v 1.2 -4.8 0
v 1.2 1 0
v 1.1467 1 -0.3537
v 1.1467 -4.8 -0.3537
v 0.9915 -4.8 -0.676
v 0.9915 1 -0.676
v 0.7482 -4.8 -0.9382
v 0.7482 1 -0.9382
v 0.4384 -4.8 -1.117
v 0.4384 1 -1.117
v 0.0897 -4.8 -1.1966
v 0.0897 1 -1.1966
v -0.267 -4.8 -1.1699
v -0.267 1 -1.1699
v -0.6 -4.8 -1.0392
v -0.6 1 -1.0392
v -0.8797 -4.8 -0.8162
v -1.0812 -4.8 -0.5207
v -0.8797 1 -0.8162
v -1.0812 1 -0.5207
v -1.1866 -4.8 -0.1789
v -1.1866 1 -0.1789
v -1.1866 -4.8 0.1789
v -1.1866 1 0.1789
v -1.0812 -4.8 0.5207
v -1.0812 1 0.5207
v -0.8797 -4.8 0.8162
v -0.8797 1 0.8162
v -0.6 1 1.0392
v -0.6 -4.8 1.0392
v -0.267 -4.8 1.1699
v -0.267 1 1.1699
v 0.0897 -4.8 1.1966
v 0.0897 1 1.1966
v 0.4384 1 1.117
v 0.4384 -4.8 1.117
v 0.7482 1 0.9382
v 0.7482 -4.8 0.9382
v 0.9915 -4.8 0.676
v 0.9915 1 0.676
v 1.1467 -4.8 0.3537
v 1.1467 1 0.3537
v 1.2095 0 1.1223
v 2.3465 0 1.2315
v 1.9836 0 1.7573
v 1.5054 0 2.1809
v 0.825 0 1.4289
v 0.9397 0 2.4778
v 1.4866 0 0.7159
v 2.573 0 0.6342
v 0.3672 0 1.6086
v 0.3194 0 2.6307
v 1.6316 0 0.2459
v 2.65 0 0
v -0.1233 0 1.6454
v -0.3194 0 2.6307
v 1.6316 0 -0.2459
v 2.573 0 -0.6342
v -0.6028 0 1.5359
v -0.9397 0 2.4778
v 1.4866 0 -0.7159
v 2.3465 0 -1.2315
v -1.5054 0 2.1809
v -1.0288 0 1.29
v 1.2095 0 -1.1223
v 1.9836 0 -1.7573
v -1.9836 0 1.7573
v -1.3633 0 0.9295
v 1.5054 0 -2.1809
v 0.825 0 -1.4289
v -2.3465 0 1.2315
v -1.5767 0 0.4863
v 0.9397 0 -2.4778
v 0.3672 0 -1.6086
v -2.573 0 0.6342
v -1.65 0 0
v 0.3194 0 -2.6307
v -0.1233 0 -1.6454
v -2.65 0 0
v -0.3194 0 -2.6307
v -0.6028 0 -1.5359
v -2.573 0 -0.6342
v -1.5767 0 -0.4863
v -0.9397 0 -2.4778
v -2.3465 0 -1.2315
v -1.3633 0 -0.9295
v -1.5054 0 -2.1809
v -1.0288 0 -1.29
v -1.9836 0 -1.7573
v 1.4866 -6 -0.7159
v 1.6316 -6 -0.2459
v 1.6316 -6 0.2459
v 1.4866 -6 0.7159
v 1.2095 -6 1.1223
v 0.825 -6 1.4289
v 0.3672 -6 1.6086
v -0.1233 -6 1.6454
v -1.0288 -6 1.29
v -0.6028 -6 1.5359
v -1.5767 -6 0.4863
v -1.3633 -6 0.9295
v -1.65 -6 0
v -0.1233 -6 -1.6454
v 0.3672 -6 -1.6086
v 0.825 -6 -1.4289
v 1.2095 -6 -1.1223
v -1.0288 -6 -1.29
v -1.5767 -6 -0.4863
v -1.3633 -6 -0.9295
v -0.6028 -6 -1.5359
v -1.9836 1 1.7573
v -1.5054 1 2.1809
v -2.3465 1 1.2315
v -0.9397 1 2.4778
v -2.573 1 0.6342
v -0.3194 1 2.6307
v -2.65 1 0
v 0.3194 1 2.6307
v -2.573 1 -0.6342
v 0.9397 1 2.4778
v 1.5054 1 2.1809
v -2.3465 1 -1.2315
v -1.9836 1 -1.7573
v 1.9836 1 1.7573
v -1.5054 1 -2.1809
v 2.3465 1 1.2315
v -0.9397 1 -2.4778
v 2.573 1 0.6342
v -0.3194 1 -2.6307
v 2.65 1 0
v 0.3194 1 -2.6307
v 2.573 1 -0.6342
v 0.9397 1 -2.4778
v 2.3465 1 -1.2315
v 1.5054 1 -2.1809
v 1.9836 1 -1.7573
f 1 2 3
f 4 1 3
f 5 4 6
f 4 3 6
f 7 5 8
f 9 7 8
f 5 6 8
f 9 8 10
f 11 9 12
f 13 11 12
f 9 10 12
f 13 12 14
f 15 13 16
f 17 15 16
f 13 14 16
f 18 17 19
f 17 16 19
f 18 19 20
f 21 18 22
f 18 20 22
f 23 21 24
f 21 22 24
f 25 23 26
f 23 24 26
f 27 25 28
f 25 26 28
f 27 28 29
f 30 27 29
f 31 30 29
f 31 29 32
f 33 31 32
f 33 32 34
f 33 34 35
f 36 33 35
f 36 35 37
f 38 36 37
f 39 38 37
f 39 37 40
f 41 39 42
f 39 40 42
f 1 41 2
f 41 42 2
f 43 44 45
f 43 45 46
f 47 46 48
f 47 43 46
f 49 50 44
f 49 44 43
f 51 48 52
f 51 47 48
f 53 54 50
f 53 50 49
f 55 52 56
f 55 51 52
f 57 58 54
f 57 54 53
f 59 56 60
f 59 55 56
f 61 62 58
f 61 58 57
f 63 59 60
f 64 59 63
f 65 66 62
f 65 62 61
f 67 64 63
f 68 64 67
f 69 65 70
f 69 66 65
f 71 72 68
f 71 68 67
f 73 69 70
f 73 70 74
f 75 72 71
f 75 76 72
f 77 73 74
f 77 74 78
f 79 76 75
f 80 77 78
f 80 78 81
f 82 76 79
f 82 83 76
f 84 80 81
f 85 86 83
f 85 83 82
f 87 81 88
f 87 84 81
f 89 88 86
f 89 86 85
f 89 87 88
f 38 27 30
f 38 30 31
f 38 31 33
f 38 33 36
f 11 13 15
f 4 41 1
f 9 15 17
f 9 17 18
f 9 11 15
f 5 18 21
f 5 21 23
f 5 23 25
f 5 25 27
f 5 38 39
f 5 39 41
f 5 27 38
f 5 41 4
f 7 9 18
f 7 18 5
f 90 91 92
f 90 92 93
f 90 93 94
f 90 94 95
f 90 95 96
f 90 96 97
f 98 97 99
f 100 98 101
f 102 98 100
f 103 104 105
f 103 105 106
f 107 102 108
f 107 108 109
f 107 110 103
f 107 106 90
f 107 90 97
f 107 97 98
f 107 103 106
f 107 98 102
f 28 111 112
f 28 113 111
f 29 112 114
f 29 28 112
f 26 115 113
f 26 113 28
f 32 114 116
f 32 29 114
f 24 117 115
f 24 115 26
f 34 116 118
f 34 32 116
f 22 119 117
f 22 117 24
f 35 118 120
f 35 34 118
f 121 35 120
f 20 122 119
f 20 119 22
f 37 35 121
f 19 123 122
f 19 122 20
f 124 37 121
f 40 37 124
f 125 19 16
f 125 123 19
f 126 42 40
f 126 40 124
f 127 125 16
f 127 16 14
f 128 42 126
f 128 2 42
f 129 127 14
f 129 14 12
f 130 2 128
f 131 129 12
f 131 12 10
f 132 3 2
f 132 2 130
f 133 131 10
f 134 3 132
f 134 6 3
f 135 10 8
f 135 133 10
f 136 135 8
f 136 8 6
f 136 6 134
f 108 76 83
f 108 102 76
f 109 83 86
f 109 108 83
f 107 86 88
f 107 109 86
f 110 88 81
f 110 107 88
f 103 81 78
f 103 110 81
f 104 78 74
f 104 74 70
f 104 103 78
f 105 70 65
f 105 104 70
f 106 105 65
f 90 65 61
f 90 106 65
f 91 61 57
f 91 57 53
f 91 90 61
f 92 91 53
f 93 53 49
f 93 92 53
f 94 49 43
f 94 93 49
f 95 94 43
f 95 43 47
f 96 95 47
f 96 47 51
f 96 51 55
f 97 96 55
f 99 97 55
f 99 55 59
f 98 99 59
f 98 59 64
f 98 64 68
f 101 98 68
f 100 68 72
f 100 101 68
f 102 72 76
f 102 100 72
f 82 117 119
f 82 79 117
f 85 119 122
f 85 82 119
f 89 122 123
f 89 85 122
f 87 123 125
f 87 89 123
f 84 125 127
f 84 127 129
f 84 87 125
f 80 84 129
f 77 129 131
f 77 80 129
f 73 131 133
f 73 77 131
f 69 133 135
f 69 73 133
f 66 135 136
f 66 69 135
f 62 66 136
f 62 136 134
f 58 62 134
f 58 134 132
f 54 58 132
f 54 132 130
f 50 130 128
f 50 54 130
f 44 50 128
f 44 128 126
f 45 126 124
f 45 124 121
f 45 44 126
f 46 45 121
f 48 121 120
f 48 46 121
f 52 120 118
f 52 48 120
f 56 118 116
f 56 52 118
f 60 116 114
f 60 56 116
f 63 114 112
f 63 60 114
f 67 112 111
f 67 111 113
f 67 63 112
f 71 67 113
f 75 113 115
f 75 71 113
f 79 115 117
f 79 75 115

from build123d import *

# Parameters (mm, degrees)
SKETCH3_R          = 1.2
CUT_EXTRUDE1_DEPTH = 5.8


with BuildPart() as part:
    # Sketch2 → Revolve2 (revolve)
    with BuildSketch(Plane.XY):
        Polygon((-1.65, 0), (-1.65, -6), (0, -6), (0, 1), (-2.65, 1), (-2.65, 0), align=None)
    revolve(axis=Axis((0, 2, 0), (0, -1, 0)))

    # Sketch3 → Cut-Extrude1 (cut)
    with BuildSketch(Plane(origin=(0, 1, 0), x_dir=(1, 0, 0), z_dir=(0, 1, 0))):
        Circle(SKETCH3_R)
    extrude(amount=-CUT_EXTRUDE1_DEPTH, mode=Mode.SUBTRACT)


solid = part.part
